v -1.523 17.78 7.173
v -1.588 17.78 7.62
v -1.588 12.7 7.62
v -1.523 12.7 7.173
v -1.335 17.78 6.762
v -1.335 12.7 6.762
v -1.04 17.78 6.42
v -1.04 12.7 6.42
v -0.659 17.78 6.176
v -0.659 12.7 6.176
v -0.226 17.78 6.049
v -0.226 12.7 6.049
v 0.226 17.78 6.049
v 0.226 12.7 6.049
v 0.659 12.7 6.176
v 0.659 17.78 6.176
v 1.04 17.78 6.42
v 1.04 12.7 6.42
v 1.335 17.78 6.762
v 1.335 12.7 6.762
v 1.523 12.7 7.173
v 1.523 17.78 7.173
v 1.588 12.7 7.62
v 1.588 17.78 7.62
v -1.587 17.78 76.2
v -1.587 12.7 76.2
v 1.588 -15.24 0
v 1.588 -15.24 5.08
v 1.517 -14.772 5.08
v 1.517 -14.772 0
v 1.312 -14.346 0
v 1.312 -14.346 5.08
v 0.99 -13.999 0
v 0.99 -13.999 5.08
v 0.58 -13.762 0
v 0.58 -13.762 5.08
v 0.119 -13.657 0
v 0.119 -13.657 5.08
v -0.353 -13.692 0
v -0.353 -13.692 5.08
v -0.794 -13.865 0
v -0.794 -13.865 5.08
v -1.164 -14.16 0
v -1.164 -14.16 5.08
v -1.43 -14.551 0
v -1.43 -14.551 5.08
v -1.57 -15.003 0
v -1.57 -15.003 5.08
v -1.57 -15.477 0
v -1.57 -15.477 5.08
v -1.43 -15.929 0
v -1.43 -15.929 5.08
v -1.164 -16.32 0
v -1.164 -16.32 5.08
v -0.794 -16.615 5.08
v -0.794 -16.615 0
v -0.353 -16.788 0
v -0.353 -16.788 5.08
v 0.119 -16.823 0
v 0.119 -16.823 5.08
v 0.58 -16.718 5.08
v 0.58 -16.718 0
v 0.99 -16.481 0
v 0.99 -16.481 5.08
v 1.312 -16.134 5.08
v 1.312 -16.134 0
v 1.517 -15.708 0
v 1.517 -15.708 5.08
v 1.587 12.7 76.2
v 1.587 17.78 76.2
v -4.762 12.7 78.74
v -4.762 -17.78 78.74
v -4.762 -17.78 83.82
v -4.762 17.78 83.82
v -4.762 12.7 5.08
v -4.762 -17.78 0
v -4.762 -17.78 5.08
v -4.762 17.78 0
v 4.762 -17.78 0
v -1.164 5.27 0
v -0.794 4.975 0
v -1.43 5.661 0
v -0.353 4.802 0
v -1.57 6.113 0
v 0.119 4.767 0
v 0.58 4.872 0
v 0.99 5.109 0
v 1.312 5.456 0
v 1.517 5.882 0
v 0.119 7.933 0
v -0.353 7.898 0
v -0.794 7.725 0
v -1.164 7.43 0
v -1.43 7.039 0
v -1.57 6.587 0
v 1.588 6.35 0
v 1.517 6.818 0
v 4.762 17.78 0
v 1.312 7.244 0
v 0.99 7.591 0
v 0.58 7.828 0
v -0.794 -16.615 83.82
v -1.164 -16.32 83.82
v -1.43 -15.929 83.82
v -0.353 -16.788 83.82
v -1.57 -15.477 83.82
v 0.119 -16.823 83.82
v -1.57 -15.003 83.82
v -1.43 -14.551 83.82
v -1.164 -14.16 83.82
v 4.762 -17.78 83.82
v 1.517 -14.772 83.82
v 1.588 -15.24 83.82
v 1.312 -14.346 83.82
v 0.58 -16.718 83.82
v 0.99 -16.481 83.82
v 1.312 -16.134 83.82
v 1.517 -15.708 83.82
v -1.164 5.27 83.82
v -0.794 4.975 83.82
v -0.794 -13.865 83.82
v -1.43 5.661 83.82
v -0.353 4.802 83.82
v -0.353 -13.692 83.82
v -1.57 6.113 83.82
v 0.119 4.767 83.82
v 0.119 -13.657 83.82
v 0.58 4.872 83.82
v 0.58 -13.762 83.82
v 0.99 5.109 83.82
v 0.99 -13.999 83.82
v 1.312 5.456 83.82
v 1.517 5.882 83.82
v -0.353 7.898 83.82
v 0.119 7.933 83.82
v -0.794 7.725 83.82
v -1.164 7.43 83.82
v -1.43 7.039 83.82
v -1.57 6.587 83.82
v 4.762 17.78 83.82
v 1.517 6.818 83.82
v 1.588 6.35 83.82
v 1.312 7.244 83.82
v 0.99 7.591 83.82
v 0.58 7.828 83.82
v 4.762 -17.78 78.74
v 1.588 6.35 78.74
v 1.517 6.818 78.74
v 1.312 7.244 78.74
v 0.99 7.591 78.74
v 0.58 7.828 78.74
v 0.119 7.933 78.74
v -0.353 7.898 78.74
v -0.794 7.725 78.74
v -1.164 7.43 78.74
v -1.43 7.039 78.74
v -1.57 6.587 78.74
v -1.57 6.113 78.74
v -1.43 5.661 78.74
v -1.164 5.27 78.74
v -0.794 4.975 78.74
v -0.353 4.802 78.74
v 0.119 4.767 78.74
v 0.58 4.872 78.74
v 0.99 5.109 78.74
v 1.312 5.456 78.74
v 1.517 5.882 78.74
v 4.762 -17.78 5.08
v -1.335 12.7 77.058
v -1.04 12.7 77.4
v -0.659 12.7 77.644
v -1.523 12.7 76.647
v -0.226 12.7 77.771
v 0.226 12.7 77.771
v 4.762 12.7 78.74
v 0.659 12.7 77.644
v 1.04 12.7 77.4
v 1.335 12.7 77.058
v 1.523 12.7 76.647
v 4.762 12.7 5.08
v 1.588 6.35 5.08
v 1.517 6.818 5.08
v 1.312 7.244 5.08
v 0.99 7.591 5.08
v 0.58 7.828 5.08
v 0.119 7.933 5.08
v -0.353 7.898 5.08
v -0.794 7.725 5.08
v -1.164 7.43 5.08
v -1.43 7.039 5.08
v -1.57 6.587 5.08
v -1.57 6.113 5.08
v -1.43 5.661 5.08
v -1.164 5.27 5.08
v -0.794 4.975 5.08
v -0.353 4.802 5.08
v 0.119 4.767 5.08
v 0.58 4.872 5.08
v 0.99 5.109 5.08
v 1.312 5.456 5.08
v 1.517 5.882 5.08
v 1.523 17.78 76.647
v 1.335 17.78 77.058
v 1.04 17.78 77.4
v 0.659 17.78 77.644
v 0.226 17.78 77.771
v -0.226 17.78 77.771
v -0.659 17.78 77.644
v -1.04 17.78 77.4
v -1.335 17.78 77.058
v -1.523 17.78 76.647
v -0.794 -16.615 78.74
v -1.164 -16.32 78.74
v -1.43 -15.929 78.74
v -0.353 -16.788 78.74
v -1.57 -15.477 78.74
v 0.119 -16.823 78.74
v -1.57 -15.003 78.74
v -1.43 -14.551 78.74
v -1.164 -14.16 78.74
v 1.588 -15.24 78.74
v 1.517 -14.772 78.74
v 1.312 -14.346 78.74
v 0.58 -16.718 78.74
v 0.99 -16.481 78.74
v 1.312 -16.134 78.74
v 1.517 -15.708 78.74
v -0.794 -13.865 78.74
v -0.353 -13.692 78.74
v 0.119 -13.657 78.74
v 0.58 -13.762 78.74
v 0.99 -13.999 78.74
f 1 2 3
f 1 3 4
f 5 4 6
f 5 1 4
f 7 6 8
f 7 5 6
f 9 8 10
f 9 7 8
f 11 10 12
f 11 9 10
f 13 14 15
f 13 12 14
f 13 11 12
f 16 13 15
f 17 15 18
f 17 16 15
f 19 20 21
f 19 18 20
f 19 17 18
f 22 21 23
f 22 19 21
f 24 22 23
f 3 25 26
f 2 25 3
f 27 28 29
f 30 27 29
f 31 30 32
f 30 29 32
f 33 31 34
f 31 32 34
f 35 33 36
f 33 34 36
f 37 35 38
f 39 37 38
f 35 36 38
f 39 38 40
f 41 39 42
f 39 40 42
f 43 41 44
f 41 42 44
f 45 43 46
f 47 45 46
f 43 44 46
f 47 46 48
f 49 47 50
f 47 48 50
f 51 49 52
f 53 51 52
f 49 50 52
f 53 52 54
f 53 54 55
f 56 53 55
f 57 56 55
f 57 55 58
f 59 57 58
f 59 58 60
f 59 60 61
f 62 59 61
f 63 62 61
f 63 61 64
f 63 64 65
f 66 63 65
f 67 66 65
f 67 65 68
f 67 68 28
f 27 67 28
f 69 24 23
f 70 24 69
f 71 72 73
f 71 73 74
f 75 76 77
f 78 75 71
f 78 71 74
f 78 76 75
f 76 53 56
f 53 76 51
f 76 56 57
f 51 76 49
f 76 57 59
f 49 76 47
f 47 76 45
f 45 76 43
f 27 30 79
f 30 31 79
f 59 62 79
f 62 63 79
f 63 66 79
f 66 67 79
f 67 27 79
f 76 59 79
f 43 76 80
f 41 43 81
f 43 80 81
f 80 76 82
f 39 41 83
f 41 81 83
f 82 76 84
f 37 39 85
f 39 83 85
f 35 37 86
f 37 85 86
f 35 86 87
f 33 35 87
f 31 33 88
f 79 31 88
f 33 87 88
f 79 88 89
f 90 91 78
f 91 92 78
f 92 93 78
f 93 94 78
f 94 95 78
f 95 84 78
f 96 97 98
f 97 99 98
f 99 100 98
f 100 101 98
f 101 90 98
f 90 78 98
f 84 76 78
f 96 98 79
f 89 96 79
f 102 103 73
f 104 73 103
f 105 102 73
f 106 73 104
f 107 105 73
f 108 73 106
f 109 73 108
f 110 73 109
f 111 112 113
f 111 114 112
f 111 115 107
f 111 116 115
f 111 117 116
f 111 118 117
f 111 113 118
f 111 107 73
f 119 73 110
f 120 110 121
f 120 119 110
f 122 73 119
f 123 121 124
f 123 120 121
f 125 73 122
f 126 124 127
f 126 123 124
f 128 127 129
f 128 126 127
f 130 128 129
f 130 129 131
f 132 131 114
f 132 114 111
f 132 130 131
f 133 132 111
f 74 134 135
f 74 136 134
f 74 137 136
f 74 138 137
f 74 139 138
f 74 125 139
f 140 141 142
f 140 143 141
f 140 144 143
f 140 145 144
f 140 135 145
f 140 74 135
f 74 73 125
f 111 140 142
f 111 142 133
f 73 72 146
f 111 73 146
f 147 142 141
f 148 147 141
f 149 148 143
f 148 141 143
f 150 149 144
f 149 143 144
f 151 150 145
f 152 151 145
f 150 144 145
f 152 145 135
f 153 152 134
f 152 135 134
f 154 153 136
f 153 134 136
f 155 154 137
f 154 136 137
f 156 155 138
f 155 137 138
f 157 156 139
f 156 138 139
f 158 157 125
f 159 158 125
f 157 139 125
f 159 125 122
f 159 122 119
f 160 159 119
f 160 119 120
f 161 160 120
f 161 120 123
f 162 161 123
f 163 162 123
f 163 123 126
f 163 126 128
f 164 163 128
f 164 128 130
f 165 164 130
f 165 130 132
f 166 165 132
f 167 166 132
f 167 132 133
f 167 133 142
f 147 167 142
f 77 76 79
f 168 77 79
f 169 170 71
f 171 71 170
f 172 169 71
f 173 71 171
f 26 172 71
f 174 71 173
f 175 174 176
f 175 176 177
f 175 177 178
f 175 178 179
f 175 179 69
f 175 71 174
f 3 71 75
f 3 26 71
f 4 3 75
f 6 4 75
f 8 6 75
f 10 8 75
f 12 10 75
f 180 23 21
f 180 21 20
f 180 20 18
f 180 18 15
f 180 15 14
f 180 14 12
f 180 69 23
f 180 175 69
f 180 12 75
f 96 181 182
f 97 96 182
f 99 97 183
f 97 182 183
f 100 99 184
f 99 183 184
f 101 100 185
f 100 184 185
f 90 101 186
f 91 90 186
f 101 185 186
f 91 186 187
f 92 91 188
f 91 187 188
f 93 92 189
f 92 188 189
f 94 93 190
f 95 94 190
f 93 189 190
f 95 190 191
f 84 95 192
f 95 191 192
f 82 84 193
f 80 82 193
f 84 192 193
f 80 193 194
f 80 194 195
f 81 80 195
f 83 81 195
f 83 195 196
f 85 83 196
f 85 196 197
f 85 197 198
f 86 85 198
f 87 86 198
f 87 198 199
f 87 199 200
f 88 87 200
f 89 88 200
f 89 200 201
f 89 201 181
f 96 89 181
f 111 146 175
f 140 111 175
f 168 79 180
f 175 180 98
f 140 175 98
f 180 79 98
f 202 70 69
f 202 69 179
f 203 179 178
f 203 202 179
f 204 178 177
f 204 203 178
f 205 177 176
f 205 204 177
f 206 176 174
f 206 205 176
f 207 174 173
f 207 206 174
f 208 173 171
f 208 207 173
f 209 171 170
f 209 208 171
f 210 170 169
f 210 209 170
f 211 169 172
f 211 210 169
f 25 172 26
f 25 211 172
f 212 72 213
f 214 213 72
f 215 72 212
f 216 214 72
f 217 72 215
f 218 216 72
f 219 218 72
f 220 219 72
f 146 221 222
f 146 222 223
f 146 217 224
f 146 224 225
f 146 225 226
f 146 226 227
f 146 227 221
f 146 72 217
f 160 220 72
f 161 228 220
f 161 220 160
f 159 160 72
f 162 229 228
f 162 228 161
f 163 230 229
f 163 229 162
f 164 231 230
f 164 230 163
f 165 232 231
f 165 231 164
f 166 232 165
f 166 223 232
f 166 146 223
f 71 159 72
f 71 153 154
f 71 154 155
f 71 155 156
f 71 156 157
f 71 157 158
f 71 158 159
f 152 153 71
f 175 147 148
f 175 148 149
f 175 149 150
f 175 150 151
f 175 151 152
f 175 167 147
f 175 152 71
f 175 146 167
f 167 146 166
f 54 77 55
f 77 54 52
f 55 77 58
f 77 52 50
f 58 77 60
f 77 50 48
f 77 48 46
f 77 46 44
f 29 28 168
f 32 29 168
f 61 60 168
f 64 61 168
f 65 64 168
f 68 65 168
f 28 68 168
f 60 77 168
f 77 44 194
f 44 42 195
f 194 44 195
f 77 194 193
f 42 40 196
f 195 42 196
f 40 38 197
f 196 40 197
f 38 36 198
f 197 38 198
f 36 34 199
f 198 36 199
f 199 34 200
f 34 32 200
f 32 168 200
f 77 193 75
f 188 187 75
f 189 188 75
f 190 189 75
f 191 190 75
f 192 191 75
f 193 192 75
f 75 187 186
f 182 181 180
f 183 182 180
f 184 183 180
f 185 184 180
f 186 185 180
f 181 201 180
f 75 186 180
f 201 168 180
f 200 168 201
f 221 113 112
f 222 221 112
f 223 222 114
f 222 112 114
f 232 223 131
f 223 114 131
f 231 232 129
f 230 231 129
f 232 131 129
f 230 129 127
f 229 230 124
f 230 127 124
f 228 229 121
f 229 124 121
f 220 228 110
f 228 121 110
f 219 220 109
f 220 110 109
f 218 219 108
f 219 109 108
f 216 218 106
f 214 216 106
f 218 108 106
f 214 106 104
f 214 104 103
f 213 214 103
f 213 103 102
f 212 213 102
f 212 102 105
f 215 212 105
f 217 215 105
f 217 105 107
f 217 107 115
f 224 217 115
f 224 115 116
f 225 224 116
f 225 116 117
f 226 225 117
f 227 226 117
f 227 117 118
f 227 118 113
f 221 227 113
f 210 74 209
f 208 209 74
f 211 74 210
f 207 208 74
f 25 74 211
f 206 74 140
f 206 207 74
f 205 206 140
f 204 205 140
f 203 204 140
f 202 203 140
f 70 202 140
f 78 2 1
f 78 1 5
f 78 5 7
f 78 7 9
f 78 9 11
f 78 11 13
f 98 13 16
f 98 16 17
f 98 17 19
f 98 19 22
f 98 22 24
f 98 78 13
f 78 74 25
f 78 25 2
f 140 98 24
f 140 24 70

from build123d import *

# Parameters (mm, degrees)
SKETCH1_W           = 9.525
SKETCH1_H           = 35.56
BOSS_EXTRUDE1_DEPTH = 83.82
SKETCH2_W           = 73.66
SKETCH2_H           = 30.48
CUT_EXTRUDE1_DEPTH  = 78.74
CUT_EXTRUDE2_DEPTH  = 78.74
SKETCH4_R           = 1.5875
CUT_EXTRUDE3_DEPTH  = 84.82
SKETCH5_R           = 1.5875
CUT_EXTRUDE4_DEPTH  = 84.82


with BuildPart() as part:
    # Sketch1 → Boss-Extrude1 (new body)
    with BuildSketch(Plane.XY):
        Rectangle(SKETCH1_W, SKETCH1_H)
    extrude(amount=BOSS_EXTRUDE1_DEPTH)

    # Sketch2 → Cut-Extrude1 (cut)
    with BuildSketch(Plane(origin=(4.7625, 0, 0), x_dir=(0, 0, -1), z_dir=(1, 0, 0))):
        with Locations((-41.91, -2.54)):
            Rectangle(SKETCH2_W, SKETCH2_H)
    extrude(amount=-CUT_EXTRUDE1_DEPTH, mode=Mode.SUBTRACT)

    # Sketch3 → Cut-Extrude2 (cut)
    with BuildSketch(Plane(origin=(0, 17.78, 0), x_dir=(1, 0, 0), z_dir=(0, 1, 0))):
        with BuildLine():
            Line((-1.5875, -76.2), (-1.5875, -7.62))
            ThreePointArc((-1.5875, -7.62), (0, -6.0325), (1.5875, -7.62))
            Line((1.5875, -7.62), (1.5875, -76.2))
            ThreePointArc((1.5875, -76.2), (0, -77.7875), (-1.5875, -76.2))
        make_face()
    extrude(amount=-CUT_EXTRUDE2_DEPTH, mode=Mode.SUBTRACT)

    # Sketch4 → Cut-Extrude3 (cut, through all)
    with BuildSketch(Plane.XY.offset(83.82)):
        with Locations((0, -15.24)):
            Circle(SKETCH4_R)
    extrude(amount=-CUT_EXTRUDE3_DEPTH, mode=Mode.SUBTRACT)

    # Sketch5 → Cut-Extrude4 (cut, through all)
    with BuildSketch(Plane.XY.offset(83.82)):
        with Locations((0, 6.35)):
            Circle(SKETCH5_R)
    extrude(amount=-CUT_EXTRUDE4_DEPTH, mode=Mode.SUBTRACT)


solid = part.part
